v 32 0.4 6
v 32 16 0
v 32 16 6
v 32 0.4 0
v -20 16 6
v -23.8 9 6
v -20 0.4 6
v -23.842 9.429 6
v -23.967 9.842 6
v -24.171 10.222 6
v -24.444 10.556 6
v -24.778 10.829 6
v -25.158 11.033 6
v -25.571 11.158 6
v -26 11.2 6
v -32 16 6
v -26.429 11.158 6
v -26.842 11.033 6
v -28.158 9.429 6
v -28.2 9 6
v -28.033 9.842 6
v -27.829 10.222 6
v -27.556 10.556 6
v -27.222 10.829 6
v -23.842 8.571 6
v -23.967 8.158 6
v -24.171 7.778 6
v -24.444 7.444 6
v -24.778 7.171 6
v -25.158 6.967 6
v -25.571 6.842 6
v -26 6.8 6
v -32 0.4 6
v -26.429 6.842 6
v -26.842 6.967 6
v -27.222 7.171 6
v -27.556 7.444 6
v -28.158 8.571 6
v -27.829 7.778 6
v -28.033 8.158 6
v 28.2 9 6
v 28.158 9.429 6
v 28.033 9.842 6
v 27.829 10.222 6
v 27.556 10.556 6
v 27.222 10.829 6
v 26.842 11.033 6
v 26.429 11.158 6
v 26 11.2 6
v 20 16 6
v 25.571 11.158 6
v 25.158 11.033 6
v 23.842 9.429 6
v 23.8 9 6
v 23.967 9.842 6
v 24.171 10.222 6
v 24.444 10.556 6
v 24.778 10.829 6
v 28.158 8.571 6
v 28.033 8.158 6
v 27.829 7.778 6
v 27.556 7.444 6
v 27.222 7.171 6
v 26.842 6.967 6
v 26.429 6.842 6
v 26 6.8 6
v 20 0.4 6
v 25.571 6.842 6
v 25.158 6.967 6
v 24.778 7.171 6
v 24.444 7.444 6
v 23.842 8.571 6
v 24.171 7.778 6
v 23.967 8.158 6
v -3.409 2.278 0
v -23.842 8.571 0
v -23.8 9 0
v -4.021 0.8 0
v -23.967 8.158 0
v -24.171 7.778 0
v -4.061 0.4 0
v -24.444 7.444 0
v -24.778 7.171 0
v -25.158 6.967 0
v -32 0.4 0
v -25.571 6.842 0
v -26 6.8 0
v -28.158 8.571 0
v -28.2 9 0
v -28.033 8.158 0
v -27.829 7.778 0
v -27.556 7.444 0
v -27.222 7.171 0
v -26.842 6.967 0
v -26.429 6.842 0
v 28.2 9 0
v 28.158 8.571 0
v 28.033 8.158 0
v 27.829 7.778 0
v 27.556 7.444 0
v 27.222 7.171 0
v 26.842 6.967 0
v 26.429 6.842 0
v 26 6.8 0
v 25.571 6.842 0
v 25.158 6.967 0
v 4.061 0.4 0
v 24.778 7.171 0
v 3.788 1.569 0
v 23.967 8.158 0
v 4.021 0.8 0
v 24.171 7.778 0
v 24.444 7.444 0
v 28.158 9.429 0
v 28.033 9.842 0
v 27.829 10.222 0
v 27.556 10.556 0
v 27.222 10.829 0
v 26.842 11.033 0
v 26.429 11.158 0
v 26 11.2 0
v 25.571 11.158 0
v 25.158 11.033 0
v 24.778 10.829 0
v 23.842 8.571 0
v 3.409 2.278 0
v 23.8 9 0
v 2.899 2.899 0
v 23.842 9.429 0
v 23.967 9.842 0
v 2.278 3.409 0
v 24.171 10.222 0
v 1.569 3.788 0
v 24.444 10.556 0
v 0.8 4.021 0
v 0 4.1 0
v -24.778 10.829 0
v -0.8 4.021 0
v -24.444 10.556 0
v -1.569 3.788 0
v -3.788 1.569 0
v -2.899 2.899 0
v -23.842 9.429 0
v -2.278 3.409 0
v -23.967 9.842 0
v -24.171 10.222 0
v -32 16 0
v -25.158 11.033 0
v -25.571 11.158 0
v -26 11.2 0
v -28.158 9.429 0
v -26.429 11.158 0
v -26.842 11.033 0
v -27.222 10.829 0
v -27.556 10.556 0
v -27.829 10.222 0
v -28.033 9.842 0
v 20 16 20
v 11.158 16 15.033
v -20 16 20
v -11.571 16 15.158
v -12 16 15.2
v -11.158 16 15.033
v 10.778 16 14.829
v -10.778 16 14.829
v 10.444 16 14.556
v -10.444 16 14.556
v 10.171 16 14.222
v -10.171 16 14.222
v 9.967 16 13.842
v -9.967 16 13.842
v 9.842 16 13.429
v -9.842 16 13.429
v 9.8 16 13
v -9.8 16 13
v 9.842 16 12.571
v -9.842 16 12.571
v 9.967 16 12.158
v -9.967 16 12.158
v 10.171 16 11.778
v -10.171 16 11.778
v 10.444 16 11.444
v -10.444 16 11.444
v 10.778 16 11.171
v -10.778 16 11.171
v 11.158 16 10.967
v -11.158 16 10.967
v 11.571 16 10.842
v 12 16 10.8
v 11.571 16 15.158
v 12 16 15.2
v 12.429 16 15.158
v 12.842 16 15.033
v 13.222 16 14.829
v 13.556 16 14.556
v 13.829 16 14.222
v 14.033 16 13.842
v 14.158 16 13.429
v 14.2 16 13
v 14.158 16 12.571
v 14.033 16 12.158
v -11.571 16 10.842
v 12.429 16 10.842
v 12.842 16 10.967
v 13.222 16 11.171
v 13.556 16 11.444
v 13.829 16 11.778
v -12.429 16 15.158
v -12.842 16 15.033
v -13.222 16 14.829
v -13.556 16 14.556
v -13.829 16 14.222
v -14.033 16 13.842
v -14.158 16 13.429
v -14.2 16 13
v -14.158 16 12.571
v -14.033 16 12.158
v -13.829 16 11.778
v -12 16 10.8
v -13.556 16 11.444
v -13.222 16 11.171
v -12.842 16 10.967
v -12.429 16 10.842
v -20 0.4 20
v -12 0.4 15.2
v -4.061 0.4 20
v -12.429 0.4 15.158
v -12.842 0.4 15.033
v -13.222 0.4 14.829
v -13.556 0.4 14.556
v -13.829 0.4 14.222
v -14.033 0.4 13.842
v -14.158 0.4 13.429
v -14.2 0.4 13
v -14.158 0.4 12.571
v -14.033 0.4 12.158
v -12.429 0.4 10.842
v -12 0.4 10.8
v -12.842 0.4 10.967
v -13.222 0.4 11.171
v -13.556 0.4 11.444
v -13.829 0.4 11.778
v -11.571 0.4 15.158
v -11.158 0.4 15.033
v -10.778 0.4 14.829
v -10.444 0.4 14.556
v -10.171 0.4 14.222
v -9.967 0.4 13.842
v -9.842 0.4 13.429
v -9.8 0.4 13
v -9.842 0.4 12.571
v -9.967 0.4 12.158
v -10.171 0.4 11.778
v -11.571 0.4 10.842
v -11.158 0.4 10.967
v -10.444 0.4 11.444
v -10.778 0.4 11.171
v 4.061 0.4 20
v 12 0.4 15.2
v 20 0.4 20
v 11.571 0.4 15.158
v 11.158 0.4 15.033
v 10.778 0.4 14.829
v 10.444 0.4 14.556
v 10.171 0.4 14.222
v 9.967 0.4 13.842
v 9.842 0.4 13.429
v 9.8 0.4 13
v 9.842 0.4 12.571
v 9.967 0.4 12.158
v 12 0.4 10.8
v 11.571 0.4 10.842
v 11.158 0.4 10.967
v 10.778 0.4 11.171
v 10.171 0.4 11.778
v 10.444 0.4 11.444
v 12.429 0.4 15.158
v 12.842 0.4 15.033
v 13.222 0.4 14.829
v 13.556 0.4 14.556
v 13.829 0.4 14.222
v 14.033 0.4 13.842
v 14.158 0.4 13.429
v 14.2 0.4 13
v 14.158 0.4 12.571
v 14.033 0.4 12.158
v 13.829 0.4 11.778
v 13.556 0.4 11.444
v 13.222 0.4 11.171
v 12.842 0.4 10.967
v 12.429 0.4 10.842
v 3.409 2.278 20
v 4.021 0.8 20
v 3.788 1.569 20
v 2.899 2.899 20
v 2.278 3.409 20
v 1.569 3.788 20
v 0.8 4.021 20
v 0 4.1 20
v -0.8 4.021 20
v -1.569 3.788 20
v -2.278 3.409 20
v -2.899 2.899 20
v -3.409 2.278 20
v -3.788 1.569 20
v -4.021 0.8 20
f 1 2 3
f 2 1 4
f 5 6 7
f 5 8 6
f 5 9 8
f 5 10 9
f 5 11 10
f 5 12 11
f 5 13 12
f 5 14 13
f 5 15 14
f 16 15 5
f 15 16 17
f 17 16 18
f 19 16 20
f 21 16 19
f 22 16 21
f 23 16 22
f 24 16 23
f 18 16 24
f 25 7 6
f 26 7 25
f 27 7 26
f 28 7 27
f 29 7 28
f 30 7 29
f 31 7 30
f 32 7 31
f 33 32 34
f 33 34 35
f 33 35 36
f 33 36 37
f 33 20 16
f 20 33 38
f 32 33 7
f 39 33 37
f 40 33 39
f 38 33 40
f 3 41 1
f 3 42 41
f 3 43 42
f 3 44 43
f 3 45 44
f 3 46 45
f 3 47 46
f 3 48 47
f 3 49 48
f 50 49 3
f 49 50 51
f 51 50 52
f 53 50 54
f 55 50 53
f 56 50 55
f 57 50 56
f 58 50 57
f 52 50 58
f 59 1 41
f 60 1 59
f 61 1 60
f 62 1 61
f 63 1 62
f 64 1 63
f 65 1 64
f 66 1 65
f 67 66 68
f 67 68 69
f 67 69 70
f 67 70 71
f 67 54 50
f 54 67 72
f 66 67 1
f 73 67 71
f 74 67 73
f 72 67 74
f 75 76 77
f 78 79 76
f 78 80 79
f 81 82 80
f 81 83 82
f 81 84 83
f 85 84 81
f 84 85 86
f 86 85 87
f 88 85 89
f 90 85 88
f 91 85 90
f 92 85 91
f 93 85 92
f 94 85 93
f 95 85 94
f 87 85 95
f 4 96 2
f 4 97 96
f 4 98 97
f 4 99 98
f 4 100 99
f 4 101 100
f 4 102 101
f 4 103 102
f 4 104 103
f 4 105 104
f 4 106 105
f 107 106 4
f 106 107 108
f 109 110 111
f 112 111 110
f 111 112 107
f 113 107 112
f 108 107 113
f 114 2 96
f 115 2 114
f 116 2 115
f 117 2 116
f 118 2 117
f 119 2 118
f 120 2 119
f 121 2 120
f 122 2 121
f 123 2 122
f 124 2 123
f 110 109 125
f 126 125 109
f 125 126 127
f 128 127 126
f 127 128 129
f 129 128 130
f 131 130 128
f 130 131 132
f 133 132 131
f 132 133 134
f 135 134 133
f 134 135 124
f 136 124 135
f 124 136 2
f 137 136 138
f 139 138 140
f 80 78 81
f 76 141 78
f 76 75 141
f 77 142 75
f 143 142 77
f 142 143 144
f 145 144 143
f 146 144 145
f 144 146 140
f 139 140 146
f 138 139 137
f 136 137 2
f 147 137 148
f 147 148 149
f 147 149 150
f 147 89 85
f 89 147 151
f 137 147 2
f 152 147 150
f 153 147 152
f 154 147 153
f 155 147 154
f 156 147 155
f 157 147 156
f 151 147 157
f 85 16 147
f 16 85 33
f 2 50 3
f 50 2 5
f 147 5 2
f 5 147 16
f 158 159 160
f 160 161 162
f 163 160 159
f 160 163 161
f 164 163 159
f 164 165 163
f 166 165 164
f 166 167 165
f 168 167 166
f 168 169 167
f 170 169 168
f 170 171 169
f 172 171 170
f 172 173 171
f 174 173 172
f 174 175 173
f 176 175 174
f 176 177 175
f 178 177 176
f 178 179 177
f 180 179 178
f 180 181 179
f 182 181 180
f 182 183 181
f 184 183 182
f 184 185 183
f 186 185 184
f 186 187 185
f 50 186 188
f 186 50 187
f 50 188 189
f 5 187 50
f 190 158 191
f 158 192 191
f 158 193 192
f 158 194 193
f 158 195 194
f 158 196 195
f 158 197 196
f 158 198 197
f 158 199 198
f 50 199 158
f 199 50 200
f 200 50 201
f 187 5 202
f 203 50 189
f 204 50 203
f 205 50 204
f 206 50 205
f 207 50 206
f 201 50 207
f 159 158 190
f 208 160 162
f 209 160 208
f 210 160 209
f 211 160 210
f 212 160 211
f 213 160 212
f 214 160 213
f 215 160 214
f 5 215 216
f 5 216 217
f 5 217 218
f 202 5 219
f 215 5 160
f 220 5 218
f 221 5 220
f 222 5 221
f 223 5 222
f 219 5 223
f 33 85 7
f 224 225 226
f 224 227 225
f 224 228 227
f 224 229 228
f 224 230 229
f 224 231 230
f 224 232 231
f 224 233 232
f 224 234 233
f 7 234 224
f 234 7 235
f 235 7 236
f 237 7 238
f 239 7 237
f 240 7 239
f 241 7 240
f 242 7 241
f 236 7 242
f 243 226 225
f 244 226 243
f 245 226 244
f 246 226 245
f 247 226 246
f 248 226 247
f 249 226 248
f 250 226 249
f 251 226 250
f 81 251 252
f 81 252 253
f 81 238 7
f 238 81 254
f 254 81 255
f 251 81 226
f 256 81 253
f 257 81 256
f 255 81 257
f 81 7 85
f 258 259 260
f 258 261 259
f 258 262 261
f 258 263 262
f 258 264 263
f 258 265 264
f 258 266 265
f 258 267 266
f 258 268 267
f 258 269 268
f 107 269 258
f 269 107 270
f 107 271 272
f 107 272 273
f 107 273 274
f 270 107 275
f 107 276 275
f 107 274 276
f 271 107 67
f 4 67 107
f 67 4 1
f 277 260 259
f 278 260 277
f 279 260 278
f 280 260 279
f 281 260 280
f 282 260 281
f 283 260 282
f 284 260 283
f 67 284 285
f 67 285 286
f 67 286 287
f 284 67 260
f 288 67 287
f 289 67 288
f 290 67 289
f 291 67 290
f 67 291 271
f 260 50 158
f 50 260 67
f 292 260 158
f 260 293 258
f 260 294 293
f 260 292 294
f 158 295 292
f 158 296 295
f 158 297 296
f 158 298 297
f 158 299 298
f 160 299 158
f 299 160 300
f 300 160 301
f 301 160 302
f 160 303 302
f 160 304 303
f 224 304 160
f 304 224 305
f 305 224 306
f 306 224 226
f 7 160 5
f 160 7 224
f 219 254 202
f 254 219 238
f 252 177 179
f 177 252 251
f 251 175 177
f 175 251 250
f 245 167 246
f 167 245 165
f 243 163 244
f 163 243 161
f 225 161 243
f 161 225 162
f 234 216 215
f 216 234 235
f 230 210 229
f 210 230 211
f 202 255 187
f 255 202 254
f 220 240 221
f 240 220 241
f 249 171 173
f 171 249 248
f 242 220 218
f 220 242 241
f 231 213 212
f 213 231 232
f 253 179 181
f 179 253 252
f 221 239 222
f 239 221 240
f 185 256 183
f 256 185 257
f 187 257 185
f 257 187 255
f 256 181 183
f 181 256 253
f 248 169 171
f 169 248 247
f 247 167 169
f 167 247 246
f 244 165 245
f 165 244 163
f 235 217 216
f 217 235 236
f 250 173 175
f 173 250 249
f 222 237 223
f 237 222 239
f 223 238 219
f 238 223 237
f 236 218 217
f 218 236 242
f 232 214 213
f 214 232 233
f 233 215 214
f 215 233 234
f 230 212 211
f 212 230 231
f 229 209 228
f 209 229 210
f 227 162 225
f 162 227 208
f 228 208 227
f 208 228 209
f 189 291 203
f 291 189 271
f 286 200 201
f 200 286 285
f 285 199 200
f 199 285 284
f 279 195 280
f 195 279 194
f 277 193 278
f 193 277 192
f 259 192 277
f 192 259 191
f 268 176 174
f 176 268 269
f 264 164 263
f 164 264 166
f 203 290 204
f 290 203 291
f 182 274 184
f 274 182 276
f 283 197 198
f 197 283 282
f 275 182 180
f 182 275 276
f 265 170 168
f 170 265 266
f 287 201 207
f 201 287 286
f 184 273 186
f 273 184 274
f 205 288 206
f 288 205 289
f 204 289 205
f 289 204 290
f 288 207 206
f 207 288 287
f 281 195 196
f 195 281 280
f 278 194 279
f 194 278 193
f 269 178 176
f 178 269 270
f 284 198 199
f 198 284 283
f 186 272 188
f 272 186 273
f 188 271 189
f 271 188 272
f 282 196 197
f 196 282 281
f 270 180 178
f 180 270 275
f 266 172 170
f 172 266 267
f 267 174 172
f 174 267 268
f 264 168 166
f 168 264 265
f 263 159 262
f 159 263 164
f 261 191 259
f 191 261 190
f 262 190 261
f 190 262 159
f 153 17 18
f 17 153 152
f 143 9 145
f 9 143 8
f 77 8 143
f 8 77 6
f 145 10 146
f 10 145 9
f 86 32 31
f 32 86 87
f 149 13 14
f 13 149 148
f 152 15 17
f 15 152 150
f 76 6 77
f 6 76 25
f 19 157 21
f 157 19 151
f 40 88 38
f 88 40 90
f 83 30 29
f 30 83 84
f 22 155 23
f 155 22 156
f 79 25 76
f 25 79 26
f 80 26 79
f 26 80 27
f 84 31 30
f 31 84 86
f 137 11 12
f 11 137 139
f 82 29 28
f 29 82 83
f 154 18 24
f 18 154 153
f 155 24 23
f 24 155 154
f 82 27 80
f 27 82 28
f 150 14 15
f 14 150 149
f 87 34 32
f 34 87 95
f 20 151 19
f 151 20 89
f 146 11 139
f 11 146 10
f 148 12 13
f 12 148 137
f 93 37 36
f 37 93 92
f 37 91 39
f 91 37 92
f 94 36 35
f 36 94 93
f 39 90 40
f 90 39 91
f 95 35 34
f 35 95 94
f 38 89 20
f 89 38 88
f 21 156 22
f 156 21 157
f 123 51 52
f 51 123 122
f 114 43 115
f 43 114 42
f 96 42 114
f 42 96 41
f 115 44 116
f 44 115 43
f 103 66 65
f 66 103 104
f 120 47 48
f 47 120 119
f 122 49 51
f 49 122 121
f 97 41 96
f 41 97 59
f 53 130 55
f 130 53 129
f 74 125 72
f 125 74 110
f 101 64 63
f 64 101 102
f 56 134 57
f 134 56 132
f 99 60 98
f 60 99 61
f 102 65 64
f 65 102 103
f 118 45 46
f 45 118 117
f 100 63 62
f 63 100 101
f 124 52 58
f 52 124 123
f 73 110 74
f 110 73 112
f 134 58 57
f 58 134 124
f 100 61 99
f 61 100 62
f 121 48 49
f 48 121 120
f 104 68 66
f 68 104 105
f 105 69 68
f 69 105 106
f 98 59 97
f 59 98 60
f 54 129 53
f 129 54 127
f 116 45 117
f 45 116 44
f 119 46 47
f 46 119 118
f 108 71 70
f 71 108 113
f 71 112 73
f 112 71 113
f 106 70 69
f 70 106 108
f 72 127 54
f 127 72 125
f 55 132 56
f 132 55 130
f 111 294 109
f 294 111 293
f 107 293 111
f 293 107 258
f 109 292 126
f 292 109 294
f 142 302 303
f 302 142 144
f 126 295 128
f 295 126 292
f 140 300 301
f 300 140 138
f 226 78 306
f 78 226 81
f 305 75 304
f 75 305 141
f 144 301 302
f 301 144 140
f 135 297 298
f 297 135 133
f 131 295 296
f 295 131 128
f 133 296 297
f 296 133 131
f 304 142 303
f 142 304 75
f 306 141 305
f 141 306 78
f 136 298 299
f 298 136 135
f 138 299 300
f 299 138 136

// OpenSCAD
// file: ../../lib/arbi.scad
// Shared ARBI OpenSCAD helpers.
// Units: millimetres. License: AGPL-3.0-only.

ARBI_EPSILON = 0.02;
ARBI_DEFAULT_FACETS = 96;

module arbi_tube(
    outer_diameter,
    inner_diameter,
    height,
    center = false,
    facets = ARBI_DEFAULT_FACETS
) {
    assert(outer_diameter > inner_diameter, "Tube outer diameter must exceed inner diameter.");
    assert(inner_diameter >= 0, "Tube inner diameter cannot be negative.");
    assert(height > 0, "Tube height must be positive.");

    difference() {
        cylinder(d = outer_diameter, h = height, center = center, $fn = facets);
        translate([0, 0, center ? 0 : -ARBI_EPSILON])
            cylinder(
                d = inner_diameter,
                h = height + 2 * ARBI_EPSILON,
                center = center,
                $fn = facets
            );
    }
}

module arbi_rounded_box(
    size,
    radius,
    center = false,
    facets = ARBI_DEFAULT_FACETS
) {
    assert(len(size) == 3, "Rounded-box size must have three dimensions.");
    assert(min(size) > 0, "Rounded-box dimensions must be positive.");
    assert(radius > 0, "Rounded-box radius must be positive.");
    assert(2 * radius <= min(size[0], size[1]), "Rounded-box radius is too large.");

    offset = center ? [0, 0, 0] : [size[0] / 2, size[1] / 2, size[2] / 2];

    translate(offset)
        hull()
            for (x = [-size[0] / 2 + radius, size[0] / 2 - radius])
                for (y = [-size[1] / 2 + radius, size[1] / 2 - radius])
                    translate([x, y, 0])
                        cylinder(r = radius, h = size[2], center = true, $fn = facets);
}

module arbi_capsule_bar(
    length,
    width,
    height,
    center = true,
    facets = ARBI_DEFAULT_FACETS
) {
    assert(length >= width, "Capsule length must be at least its width.");
    assert(width > 0 && height > 0, "Capsule dimensions must be positive.");

    offset = center ? [0, 0, 0] : [length / 2, width / 2, height / 2];

    translate(offset)
        hull()
            for (x = [-(length - width) / 2, (length - width) / 2])
                translate([x, 0, 0])
                    cylinder(d = width, h = height, center = true, $fn = facets);
}

module arbi_bolt_circle(
    count,
    radius,
    hole_diameter,
    height,
    phase = 0,
    facets = ARBI_DEFAULT_FACETS
) {
    assert(count >= 1, "Bolt-circle count must be positive.");
    assert(radius > 0 && hole_diameter > 0 && height > 0, "Bolt-circle dimensions must be positive.");

    for (index = [0 : count - 1])
        rotate([0, 0, phase + index * 360 / count])
            translate([radius, 0, 0])
                cylinder(d = hole_diameter, h = height, center = true, $fn = facets);
}

// Product appearance only; colors do not specify material or validation status.
ARBI_SHELL = [0.94, 0.94, 0.92];
ARBI_CORE = [0.12, 0.14, 0.15];
ARBI_METAL = [0.66, 0.70, 0.73];
// main file
// ARBI winch-drum-clamp-half 0.1.0 — concept-unvalidated fabrication geometry.
include <../../lib/winch-drum.scad>
color(ARBI_CORE)wd_clamp_half();
